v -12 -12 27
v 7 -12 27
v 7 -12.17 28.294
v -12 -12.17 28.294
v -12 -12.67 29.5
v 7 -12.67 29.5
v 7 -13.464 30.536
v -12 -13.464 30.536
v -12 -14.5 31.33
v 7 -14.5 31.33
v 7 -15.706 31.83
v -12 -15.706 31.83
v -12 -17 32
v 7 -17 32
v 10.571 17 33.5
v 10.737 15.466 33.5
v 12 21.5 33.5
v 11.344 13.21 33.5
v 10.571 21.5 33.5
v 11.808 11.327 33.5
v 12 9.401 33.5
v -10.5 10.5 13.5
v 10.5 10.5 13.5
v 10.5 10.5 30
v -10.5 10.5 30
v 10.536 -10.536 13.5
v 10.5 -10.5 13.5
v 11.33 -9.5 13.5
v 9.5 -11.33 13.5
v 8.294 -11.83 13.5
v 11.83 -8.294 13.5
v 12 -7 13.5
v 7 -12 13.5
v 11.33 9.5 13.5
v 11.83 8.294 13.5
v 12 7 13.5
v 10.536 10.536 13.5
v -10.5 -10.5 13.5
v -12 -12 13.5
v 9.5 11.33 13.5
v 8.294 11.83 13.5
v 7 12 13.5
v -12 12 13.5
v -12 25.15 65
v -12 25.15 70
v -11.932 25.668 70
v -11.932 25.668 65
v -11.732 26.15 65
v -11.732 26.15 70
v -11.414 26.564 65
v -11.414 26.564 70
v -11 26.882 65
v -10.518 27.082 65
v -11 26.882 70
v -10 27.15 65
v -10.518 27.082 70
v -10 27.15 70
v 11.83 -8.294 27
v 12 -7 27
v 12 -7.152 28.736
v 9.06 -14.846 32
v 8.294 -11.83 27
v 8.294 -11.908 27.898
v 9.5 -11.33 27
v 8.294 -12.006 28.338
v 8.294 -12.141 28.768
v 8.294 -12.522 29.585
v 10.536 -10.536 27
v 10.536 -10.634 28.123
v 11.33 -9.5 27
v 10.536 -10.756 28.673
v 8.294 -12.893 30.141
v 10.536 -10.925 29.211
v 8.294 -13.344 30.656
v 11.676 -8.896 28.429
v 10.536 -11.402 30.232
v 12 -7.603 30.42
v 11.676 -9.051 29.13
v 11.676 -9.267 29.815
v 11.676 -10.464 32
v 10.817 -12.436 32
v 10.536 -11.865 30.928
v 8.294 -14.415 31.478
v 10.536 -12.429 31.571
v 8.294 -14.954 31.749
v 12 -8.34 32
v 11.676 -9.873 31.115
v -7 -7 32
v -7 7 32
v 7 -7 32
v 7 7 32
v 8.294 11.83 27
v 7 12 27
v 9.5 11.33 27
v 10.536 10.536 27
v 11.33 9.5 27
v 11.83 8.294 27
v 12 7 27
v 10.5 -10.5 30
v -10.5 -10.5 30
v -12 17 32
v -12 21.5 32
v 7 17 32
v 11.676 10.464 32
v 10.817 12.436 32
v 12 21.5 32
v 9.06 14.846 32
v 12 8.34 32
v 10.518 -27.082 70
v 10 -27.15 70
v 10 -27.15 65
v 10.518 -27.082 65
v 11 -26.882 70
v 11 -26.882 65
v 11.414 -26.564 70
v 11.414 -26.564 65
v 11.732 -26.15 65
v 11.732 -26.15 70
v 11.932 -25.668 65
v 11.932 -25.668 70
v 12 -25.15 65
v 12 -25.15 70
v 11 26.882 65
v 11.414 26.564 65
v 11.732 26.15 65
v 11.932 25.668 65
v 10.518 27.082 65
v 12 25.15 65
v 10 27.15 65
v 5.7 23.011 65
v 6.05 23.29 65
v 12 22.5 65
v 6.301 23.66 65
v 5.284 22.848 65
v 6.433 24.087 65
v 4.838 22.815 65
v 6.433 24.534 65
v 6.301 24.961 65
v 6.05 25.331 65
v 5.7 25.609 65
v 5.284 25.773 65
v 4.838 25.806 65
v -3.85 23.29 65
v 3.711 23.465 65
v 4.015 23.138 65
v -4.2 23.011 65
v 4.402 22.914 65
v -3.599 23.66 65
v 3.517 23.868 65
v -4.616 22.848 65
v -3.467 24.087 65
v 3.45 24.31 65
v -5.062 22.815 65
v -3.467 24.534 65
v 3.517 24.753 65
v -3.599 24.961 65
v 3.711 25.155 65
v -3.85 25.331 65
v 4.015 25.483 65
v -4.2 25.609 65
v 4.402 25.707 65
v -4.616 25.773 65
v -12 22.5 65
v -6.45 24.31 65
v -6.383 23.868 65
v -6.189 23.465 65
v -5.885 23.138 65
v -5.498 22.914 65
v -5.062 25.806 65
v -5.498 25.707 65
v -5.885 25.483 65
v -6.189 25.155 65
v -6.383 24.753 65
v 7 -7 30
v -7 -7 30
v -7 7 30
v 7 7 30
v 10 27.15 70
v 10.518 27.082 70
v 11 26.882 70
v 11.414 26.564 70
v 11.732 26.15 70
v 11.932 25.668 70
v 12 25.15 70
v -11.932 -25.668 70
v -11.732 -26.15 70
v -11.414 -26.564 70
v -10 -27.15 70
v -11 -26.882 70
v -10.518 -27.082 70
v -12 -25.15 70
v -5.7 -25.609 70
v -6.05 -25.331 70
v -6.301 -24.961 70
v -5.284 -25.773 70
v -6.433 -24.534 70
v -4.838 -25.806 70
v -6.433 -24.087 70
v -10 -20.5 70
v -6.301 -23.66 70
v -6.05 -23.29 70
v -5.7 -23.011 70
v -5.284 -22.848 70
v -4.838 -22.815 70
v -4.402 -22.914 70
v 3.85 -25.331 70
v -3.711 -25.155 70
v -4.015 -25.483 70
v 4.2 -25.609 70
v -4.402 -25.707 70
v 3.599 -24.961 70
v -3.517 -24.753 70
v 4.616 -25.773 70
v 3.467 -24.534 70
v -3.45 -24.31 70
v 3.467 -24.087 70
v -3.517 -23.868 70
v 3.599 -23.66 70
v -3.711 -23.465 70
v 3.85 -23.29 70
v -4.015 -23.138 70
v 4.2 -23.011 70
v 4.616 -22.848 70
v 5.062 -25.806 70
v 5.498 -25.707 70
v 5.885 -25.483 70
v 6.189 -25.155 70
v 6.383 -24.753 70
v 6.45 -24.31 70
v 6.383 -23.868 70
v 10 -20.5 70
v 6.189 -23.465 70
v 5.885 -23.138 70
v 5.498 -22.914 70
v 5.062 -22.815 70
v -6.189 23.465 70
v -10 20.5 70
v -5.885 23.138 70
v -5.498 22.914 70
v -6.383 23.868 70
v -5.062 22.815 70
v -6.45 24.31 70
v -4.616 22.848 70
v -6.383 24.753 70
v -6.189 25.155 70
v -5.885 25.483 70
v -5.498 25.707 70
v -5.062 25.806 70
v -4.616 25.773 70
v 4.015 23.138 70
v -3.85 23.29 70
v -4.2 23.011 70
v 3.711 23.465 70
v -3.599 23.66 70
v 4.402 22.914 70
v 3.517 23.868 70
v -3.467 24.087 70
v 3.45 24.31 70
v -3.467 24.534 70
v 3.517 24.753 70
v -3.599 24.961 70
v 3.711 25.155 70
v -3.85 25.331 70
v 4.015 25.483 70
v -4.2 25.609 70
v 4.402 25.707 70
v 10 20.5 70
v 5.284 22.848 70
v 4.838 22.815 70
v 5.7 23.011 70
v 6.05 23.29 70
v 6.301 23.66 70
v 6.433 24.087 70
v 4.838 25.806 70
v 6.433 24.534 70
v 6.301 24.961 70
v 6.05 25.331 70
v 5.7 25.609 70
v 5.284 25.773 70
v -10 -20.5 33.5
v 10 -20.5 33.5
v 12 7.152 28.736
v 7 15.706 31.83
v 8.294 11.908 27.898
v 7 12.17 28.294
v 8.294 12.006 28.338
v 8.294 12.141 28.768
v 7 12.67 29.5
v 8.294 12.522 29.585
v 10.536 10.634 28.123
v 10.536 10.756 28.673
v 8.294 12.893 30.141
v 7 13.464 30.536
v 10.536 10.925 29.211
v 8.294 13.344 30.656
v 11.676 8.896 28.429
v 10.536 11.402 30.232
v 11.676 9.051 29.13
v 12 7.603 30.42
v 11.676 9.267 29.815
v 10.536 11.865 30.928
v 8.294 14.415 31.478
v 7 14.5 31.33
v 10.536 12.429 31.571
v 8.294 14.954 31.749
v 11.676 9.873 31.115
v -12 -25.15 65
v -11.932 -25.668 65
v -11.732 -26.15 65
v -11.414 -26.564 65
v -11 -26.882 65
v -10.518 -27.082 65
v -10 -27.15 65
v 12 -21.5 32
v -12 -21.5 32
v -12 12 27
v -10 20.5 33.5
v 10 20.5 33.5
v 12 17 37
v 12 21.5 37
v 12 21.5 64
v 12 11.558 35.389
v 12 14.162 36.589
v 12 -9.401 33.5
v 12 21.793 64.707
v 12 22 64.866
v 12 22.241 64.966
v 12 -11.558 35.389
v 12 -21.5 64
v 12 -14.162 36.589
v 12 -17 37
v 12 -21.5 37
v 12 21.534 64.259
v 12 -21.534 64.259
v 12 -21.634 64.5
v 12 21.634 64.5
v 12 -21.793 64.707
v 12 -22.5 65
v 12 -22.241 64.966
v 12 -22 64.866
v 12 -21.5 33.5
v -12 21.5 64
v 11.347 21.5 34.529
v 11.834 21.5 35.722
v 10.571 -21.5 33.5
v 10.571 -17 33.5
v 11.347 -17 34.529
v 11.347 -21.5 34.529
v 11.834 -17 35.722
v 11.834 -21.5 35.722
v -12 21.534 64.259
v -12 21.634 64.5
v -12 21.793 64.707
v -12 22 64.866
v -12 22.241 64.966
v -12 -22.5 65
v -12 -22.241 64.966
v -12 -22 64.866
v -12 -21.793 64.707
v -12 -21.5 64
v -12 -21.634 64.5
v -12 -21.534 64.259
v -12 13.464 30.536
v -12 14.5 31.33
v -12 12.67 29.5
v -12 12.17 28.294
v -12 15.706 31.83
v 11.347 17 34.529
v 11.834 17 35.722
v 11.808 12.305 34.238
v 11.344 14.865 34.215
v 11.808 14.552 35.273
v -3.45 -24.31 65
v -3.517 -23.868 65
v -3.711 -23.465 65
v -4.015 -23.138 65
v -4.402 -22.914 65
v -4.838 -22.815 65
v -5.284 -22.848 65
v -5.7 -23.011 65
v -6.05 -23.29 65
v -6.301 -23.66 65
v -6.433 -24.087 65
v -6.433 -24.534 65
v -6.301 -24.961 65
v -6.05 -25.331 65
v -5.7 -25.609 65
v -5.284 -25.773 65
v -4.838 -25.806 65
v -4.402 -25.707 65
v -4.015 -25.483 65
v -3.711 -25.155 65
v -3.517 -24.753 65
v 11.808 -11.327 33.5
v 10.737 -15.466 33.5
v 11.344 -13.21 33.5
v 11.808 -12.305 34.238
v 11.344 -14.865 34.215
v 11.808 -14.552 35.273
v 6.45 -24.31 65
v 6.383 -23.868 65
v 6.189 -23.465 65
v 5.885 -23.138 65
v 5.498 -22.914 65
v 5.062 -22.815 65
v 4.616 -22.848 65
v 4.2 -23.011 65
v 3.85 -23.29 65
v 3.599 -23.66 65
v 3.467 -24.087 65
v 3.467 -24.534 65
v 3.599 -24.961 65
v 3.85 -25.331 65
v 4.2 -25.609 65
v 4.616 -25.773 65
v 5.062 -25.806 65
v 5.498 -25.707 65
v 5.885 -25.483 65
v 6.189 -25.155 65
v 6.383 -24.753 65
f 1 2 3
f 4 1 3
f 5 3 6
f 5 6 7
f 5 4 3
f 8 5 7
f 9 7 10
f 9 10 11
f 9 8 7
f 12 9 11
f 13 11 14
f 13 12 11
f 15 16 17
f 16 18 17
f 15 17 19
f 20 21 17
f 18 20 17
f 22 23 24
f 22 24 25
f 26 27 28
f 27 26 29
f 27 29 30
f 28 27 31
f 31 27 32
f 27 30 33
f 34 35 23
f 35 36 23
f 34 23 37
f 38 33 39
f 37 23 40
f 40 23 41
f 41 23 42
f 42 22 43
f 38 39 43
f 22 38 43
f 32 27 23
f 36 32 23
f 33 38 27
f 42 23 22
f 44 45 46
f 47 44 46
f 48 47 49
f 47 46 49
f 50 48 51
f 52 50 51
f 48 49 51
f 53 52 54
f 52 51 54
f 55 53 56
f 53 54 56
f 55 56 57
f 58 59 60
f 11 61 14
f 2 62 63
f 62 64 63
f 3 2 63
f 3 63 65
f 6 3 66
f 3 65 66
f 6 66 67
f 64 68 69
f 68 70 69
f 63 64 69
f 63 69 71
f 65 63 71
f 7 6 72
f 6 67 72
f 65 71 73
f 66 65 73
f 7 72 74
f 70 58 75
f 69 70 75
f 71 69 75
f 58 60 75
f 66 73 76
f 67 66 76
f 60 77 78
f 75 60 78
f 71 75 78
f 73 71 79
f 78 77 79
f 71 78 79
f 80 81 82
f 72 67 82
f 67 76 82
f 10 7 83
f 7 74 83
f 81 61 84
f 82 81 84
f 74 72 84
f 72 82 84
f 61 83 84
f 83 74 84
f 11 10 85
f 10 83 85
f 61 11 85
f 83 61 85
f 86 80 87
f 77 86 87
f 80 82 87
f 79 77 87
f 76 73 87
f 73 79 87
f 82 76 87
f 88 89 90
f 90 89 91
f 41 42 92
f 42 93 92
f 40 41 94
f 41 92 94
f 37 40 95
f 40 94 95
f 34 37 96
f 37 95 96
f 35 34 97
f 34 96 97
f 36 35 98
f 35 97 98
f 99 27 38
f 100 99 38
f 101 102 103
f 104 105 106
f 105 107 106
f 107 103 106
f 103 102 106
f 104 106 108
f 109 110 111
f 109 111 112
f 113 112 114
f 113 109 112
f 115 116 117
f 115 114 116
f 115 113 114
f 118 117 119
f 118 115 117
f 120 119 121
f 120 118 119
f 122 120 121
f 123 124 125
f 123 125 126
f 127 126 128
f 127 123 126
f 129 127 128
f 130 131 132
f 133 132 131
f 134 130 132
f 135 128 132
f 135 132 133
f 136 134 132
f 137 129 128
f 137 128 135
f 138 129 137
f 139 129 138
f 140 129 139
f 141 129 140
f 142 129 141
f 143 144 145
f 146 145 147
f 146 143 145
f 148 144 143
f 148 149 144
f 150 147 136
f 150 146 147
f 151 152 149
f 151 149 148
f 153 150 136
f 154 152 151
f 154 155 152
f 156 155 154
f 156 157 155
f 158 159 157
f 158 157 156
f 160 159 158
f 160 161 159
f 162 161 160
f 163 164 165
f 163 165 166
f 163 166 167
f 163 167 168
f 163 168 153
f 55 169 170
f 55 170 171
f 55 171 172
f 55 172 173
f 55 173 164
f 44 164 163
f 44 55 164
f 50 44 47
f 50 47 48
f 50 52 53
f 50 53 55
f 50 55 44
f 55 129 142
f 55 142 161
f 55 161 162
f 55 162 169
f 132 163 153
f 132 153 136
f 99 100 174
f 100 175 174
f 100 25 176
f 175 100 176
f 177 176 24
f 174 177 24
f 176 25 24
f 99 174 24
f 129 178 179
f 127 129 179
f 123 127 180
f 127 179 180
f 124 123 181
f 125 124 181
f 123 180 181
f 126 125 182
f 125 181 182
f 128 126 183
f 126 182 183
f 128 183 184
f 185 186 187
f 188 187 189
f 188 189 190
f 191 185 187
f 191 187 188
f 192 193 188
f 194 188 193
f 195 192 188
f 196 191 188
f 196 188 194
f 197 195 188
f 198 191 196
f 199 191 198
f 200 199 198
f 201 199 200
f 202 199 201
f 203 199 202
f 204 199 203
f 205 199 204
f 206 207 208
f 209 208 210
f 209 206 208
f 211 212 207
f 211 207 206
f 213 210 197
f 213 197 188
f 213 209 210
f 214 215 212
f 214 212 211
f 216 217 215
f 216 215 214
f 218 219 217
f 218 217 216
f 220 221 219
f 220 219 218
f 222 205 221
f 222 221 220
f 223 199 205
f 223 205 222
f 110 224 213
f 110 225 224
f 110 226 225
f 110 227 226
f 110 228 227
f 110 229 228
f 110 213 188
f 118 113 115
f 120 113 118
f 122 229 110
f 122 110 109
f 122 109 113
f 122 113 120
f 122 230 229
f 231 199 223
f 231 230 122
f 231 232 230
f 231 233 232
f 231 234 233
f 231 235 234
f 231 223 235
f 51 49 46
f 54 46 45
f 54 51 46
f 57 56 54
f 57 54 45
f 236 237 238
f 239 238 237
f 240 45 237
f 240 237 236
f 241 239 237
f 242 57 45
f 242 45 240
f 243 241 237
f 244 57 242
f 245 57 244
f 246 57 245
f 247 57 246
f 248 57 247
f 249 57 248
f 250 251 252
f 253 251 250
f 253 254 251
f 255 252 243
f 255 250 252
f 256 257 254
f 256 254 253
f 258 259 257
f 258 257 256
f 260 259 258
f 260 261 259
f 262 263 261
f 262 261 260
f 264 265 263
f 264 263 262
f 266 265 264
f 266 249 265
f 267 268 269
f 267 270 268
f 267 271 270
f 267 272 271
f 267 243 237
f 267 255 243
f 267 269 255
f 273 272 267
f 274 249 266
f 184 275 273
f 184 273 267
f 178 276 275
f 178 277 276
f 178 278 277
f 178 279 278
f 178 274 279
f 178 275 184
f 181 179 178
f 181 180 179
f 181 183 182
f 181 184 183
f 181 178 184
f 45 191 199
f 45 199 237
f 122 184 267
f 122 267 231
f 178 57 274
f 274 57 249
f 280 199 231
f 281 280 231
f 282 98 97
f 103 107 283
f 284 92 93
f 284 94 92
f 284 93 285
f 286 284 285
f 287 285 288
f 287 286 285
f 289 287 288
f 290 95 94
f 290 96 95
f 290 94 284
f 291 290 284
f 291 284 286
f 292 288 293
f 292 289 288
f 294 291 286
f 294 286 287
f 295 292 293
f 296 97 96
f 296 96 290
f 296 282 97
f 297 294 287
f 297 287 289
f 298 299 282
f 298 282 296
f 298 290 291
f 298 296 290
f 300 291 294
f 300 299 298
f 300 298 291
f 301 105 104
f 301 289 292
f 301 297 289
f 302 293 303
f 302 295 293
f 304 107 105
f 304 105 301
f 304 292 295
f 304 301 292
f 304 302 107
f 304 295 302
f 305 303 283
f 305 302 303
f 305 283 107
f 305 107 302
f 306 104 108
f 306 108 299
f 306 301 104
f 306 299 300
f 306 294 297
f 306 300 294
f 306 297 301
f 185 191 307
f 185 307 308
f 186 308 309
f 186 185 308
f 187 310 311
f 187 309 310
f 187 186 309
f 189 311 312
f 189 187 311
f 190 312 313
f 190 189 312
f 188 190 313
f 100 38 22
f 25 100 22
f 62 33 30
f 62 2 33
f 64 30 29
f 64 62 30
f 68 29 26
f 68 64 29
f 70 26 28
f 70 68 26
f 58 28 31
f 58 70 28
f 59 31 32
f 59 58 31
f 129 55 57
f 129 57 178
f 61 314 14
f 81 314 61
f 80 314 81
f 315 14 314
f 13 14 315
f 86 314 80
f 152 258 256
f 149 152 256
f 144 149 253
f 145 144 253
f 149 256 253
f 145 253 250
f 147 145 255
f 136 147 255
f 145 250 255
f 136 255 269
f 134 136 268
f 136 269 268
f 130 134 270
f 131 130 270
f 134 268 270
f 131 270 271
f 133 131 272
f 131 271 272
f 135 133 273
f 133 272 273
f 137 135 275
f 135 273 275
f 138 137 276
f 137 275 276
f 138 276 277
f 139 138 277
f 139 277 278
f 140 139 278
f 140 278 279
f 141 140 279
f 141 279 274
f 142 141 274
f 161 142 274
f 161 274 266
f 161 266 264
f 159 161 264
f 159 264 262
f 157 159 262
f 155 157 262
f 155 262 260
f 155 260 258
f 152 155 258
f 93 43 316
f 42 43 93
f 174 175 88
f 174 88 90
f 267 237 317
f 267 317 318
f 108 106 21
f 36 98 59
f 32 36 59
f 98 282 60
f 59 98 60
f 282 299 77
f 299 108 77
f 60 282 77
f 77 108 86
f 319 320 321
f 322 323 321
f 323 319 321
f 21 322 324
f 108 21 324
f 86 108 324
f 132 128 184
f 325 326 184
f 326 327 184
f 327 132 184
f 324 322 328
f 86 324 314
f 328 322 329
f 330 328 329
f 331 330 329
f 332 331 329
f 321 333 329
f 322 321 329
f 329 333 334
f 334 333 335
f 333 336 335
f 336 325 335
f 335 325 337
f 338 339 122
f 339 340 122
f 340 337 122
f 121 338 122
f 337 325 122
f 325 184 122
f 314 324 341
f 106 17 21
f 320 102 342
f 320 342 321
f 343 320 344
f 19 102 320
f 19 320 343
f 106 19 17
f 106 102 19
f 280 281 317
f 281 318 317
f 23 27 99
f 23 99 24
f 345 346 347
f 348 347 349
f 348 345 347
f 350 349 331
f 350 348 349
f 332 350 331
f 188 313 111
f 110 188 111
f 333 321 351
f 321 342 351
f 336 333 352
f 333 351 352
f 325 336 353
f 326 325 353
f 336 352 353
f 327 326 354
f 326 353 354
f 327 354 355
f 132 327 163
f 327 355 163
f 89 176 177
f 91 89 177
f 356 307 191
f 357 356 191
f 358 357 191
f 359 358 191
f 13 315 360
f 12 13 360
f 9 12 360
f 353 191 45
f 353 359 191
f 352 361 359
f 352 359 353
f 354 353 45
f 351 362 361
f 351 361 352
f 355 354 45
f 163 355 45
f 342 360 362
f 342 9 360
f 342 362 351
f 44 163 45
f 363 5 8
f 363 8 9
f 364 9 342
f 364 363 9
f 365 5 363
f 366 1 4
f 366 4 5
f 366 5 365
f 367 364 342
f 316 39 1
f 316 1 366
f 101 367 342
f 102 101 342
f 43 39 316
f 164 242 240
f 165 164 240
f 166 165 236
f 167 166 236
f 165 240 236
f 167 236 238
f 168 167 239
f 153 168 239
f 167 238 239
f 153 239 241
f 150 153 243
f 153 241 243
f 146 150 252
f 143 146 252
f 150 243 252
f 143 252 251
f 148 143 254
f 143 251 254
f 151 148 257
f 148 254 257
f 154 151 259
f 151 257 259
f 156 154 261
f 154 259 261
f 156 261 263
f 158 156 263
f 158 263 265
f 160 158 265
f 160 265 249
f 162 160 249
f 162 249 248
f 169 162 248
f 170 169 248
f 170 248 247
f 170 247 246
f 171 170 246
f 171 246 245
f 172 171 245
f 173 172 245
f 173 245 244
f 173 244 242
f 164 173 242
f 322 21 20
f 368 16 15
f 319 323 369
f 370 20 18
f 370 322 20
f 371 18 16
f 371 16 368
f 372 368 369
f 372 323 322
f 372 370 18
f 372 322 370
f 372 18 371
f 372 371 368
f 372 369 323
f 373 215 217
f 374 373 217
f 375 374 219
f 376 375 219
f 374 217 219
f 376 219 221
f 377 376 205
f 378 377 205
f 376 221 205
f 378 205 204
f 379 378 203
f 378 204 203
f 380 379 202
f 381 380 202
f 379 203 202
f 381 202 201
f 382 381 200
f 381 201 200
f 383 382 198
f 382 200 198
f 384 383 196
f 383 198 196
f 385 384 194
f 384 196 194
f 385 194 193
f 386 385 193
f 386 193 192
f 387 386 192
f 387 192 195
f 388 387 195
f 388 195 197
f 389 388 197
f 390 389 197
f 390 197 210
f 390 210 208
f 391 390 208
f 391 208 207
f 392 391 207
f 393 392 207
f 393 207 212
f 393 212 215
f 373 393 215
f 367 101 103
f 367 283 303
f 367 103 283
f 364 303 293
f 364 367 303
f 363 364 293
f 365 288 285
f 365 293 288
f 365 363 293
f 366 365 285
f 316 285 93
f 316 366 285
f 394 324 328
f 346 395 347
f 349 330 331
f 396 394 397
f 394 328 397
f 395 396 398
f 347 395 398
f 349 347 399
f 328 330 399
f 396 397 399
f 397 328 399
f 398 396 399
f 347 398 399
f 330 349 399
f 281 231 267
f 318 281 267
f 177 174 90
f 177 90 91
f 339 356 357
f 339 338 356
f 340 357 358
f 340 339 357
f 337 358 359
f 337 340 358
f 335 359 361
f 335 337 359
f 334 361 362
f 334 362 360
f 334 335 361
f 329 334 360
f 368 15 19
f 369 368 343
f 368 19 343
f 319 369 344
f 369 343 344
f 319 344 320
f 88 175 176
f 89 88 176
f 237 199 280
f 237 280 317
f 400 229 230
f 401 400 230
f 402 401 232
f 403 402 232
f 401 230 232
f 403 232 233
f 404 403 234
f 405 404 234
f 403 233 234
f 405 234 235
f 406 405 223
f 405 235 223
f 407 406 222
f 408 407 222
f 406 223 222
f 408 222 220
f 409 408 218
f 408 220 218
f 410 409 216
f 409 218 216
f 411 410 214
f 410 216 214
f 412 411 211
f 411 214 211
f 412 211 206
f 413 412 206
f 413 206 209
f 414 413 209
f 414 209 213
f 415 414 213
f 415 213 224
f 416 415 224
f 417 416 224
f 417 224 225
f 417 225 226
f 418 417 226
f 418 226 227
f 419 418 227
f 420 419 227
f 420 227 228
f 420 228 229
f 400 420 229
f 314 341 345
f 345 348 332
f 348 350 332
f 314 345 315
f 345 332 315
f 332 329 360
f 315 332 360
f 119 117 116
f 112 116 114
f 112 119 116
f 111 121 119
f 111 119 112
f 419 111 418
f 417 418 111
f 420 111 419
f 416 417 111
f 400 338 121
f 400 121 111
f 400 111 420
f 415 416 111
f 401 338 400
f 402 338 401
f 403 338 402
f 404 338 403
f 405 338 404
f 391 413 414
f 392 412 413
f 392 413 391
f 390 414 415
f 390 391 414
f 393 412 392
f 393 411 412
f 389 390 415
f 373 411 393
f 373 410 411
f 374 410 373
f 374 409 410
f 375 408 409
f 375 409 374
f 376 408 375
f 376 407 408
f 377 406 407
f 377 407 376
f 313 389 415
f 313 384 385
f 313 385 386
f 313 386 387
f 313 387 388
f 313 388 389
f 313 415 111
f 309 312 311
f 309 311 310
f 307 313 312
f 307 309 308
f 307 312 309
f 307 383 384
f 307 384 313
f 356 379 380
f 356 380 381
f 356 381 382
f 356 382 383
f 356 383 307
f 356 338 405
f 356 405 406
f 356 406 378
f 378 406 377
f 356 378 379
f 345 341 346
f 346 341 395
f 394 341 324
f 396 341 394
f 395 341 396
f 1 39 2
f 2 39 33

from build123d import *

# Parameters (mm, degrees)
SKETCH_1_W          = 24
SKETCH_1_H          = 24
EXTRUDE_1_DEPTH     = 30
SKETCH_2_W          = 21
SKETCH_2_H          = 21
CUT_EXTRUDE_1_DEPTH = 35.467375879
SKETCH_3_W          = 5
SKETCH_3_H          = 24
EXTRUDE_3_DEPTH     = 2
SKETCH_4_W          = 19
SKETCH_4_H          = 5
EXTRUDE_4_DEPTH     = 2
SKETCH_5_W          = 5
SKETCH_5_H          = 19
EXTRUDE_5_DEPTH     = 2
SKETCH_6_W          = 14
SKETCH_6_H          = 5
EXTRUDE_6_DEPTH     = 2
SKETCH_7_W          = 24
SKETCH_7_H          = 43
EXTRUDE_7_DEPTH     = 28
SKETCH_9_W          = 20
SKETCH_9_H          = 41
CUT_EXTRUDE_2_DEPTH = 27
SKETCH_11_W         = 24
SKETCH_11_H         = 54.3
EXTRUDE_20_DEPTH    = 10
SKETCH_12_W         = 20
SKETCH_12_H         = 41
CUT_EXTRUDE_4_DEPTH = 10
SKETCH_13_R         = 1.5
CUT_EXTRUDE_5_DEPTH = 10
FILLET_2_R          = 5
FILLET_3_R          = 2
CUT_EXTRUDE_START   = -5
CUT_EXTRUDE_6_DEPTH = 5
CUT_EXTRUDE_7_DEPTH = 5
FILLET_4_R          = 1
SKETCH_17_W         = 13.5
SKETCH_17_H         = 24.100930422
CUT_EXTRUDE_8_DEPTH = 45
FILLET_6_R          = 5
EXTRUDE_START       = -1.5
EXTRUDE_23_DEPTH    = 1.5


with BuildPart() as part:
    # 草图1 → 凸台-拉伸1 (new body)
    with BuildSketch(Plane.XY):
        Rectangle(SKETCH_1_W, SKETCH_1_H)
    extrude(amount=EXTRUDE_1_DEPTH)

    # 草图2 → 切除-拉伸1 (cut, through all)
    with BuildSketch(Plane(origin=(0, 0, 0), x_dir=(-1, 0, 0), z_dir=(0, 0, -1))):
        Rectangle(SKETCH_2_W, SKETCH_2_H)
    extrude(amount=-CUT_EXTRUDE_1_DEPTH, mode=Mode.SUBTRACT)

    # 草图3 → 凸台-拉伸3 (add)
    with BuildSketch(Plane.XY.offset(30)):
        with Locations((-9.5, 0)):
            Rectangle(SKETCH_3_W, SKETCH_3_H)
    extrude(amount=EXTRUDE_3_DEPTH)

    # 草图4 → 凸台-拉伸4 (add)
    with BuildSketch(Plane.XY.offset(30)):
        with Locations((2.5, -9.5)):
            Rectangle(SKETCH_4_W, SKETCH_4_H)
    extrude(amount=EXTRUDE_4_DEPTH)

    # 草图5 → 凸台-拉伸5 (add)
    with BuildSketch(Plane.XY.offset(30)):
        with Locations((9.5, 2.5)):
            Rectangle(SKETCH_5_W, SKETCH_5_H)
    extrude(amount=EXTRUDE_5_DEPTH)

    # 草图6 → 凸台-拉伸6 (add)
    with BuildSketch(Plane.XY.offset(30)):
        with Locations((0, 9.5)):
            Rectangle(SKETCH_6_W, SKETCH_6_H)
    extrude(amount=EXTRUDE_6_DEPTH)

    # 草图7 → 凸台-拉伸7 (add)
    with BuildSketch(Plane.XY.offset(32)):
        Rectangle(SKETCH_7_W, SKETCH_7_H)
    extrude(amount=EXTRUDE_7_DEPTH)

    # 草图9 → 切除-拉伸2 (cut)
    with BuildSketch(Plane.XY.offset(60)):
        Rectangle(SKETCH_9_W, SKETCH_9_H)
    extrude(amount=-CUT_EXTRUDE_2_DEPTH, mode=Mode.SUBTRACT)

    # 草图11 → 凸台-拉伸20 (add)
    with BuildSketch(Plane.XY.offset(60)):
        Rectangle(SKETCH_11_W, SKETCH_11_H)
    extrude(amount=EXTRUDE_20_DEPTH)

    # 草图12 → 切除-拉伸4 (cut)
    with BuildSketch(Plane.XY.offset(70)):
        Rectangle(SKETCH_12_W, SKETCH_12_H)
    extrude(amount=-CUT_EXTRUDE_4_DEPTH, mode=Mode.SUBTRACT)

    # 草图13 → 切除-拉伸5 (cut)
    with BuildSketch(Plane.XY.offset(70)):
        with Locations((-4.95, -24.310374207)):
            Circle(SKETCH_13_R)
        with Locations((4.95, -24.310374207)):
            Circle(SKETCH_13_R)
        with Locations(Location((4.95, 24.310374207, 0), (0, 0, 180))):
            Circle(SKETCH_13_R)
        with Locations(Location((-4.95, 24.310374207, 0), (0, 0, 180))):
            Circle(SKETCH_13_R)
    extrude(amount=-CUT_EXTRUDE_5_DEPTH, mode=Mode.SUBTRACT)

    # 圆角2
    fillet_2_edges = [part.edges().sort_by_distance(p)[0] for p in [
        (0, -12, 32),
        (0, 12, 32),
    ]]
    fillet(fillet_2_edges, radius=FILLET_2_R)

    # 圆角3
    fillet_3_edges = [part.edges().sort_by_distance(p)[0] for p in [
        (12, -27.15, 65),
        (12, 27.15, 65),
        (-12, 27.15, 65),
        (-12, -27.15, 65),
    ]]
    fillet(fillet_3_edges, radius=FILLET_3_R)

    # 草图15 → 切除-拉伸6 (cut)
    with BuildSketch(Plane(origin=(0, 0, 60), x_dir=(-1, 0, 0), z_dir=(0, 0, -1)).offset(CUT_EXTRUDE_START)):
        with BuildLine():
            Line((-12, -21.5), (-12, -25.15))
            ThreePointArc((-12, -25.15), (-11.414213562, -26.564213562), (-10, -27.15))
            Line((-10, -27.15), (10, -27.15))
            ThreePointArc((10, -27.15), (11.414213562, -26.564213562), (12, -25.15))
            Line((12, -25.15), (12, -21.5))
            Line((12, -21.5), (-12, -21.5))
        make_face()
    extrude(amount=CUT_EXTRUDE_6_DEPTH, mode=Mode.SUBTRACT)

    # 草图16 → 切除-拉伸7 (cut)
    with BuildSketch(Plane(origin=(0, 0, 60), x_dir=(-1, 0, 0), z_dir=(0, 0, -1)).offset(CUT_EXTRUDE_START)):
        with BuildLine():
            Line((12, 21.5), (12, 25.15))
            ThreePointArc((12, 25.15), (11.414213562, 26.564213562), (10, 27.15))
            Line((10, 27.15), (-10, 27.15))
            ThreePointArc((-10, 27.15), (-11.414213562, 26.564213562), (-12, 25.15))
            Line((-12, 25.15), (-12, 21.5))
            Line((-12, 21.5), (12, 21.5))
        make_face()
    extrude(amount=CUT_EXTRUDE_7_DEPTH, mode=Mode.SUBTRACT)

    # 圆角4
    fillet_4_edges = [part.edges().sort_by_distance(p)[0] for p in [
        (0, -21.5, 65),
        (0, 21.5, 65),
    ]]
    fillet(fillet_4_edges, radius=FILLET_4_R)

    # 草图17 → 切除-拉伸8 (cut)
    with BuildSketch(Plane.ZY.offset(12)):
        with Locations((6.75, 0.050465211)):
            Rectangle(SKETCH_17_W, SKETCH_17_H)
    extrude(amount=-CUT_EXTRUDE_8_DEPTH, mode=Mode.SUBTRACT)

    # 圆角6
    fillet_6_edges = [part.edges().sort_by_distance(p)[0] for p in [
        (12, -12, 20.25),
        (12, 19.25, 32),
        (12, 12, 20.25),
        (12, -13.464466094, 30.535533906),
        (12, 13.464466094, 30.535533906),
        (12, -19.25, 32),
    ]]
    fillet(fillet_6_edges, radius=FILLET_6_R)

    # 草图27 → 凸台-拉伸23 (add)
    with BuildSketch(Plane(origin=(0, 0, 32), x_dir=(-1, 0, 0), z_dir=(0, 0, -1)).offset(EXTRUDE_START)):
        Polygon((-12, 17), (-12, 3.059411708), (-12, -3.059411708), (-12, -17), (-12, -21.5), (12, -21.5), (12, 21.5), (-12, 21.5), align=None)
    extrude(amount=EXTRUDE_23_DEPTH)


solid = part.part
